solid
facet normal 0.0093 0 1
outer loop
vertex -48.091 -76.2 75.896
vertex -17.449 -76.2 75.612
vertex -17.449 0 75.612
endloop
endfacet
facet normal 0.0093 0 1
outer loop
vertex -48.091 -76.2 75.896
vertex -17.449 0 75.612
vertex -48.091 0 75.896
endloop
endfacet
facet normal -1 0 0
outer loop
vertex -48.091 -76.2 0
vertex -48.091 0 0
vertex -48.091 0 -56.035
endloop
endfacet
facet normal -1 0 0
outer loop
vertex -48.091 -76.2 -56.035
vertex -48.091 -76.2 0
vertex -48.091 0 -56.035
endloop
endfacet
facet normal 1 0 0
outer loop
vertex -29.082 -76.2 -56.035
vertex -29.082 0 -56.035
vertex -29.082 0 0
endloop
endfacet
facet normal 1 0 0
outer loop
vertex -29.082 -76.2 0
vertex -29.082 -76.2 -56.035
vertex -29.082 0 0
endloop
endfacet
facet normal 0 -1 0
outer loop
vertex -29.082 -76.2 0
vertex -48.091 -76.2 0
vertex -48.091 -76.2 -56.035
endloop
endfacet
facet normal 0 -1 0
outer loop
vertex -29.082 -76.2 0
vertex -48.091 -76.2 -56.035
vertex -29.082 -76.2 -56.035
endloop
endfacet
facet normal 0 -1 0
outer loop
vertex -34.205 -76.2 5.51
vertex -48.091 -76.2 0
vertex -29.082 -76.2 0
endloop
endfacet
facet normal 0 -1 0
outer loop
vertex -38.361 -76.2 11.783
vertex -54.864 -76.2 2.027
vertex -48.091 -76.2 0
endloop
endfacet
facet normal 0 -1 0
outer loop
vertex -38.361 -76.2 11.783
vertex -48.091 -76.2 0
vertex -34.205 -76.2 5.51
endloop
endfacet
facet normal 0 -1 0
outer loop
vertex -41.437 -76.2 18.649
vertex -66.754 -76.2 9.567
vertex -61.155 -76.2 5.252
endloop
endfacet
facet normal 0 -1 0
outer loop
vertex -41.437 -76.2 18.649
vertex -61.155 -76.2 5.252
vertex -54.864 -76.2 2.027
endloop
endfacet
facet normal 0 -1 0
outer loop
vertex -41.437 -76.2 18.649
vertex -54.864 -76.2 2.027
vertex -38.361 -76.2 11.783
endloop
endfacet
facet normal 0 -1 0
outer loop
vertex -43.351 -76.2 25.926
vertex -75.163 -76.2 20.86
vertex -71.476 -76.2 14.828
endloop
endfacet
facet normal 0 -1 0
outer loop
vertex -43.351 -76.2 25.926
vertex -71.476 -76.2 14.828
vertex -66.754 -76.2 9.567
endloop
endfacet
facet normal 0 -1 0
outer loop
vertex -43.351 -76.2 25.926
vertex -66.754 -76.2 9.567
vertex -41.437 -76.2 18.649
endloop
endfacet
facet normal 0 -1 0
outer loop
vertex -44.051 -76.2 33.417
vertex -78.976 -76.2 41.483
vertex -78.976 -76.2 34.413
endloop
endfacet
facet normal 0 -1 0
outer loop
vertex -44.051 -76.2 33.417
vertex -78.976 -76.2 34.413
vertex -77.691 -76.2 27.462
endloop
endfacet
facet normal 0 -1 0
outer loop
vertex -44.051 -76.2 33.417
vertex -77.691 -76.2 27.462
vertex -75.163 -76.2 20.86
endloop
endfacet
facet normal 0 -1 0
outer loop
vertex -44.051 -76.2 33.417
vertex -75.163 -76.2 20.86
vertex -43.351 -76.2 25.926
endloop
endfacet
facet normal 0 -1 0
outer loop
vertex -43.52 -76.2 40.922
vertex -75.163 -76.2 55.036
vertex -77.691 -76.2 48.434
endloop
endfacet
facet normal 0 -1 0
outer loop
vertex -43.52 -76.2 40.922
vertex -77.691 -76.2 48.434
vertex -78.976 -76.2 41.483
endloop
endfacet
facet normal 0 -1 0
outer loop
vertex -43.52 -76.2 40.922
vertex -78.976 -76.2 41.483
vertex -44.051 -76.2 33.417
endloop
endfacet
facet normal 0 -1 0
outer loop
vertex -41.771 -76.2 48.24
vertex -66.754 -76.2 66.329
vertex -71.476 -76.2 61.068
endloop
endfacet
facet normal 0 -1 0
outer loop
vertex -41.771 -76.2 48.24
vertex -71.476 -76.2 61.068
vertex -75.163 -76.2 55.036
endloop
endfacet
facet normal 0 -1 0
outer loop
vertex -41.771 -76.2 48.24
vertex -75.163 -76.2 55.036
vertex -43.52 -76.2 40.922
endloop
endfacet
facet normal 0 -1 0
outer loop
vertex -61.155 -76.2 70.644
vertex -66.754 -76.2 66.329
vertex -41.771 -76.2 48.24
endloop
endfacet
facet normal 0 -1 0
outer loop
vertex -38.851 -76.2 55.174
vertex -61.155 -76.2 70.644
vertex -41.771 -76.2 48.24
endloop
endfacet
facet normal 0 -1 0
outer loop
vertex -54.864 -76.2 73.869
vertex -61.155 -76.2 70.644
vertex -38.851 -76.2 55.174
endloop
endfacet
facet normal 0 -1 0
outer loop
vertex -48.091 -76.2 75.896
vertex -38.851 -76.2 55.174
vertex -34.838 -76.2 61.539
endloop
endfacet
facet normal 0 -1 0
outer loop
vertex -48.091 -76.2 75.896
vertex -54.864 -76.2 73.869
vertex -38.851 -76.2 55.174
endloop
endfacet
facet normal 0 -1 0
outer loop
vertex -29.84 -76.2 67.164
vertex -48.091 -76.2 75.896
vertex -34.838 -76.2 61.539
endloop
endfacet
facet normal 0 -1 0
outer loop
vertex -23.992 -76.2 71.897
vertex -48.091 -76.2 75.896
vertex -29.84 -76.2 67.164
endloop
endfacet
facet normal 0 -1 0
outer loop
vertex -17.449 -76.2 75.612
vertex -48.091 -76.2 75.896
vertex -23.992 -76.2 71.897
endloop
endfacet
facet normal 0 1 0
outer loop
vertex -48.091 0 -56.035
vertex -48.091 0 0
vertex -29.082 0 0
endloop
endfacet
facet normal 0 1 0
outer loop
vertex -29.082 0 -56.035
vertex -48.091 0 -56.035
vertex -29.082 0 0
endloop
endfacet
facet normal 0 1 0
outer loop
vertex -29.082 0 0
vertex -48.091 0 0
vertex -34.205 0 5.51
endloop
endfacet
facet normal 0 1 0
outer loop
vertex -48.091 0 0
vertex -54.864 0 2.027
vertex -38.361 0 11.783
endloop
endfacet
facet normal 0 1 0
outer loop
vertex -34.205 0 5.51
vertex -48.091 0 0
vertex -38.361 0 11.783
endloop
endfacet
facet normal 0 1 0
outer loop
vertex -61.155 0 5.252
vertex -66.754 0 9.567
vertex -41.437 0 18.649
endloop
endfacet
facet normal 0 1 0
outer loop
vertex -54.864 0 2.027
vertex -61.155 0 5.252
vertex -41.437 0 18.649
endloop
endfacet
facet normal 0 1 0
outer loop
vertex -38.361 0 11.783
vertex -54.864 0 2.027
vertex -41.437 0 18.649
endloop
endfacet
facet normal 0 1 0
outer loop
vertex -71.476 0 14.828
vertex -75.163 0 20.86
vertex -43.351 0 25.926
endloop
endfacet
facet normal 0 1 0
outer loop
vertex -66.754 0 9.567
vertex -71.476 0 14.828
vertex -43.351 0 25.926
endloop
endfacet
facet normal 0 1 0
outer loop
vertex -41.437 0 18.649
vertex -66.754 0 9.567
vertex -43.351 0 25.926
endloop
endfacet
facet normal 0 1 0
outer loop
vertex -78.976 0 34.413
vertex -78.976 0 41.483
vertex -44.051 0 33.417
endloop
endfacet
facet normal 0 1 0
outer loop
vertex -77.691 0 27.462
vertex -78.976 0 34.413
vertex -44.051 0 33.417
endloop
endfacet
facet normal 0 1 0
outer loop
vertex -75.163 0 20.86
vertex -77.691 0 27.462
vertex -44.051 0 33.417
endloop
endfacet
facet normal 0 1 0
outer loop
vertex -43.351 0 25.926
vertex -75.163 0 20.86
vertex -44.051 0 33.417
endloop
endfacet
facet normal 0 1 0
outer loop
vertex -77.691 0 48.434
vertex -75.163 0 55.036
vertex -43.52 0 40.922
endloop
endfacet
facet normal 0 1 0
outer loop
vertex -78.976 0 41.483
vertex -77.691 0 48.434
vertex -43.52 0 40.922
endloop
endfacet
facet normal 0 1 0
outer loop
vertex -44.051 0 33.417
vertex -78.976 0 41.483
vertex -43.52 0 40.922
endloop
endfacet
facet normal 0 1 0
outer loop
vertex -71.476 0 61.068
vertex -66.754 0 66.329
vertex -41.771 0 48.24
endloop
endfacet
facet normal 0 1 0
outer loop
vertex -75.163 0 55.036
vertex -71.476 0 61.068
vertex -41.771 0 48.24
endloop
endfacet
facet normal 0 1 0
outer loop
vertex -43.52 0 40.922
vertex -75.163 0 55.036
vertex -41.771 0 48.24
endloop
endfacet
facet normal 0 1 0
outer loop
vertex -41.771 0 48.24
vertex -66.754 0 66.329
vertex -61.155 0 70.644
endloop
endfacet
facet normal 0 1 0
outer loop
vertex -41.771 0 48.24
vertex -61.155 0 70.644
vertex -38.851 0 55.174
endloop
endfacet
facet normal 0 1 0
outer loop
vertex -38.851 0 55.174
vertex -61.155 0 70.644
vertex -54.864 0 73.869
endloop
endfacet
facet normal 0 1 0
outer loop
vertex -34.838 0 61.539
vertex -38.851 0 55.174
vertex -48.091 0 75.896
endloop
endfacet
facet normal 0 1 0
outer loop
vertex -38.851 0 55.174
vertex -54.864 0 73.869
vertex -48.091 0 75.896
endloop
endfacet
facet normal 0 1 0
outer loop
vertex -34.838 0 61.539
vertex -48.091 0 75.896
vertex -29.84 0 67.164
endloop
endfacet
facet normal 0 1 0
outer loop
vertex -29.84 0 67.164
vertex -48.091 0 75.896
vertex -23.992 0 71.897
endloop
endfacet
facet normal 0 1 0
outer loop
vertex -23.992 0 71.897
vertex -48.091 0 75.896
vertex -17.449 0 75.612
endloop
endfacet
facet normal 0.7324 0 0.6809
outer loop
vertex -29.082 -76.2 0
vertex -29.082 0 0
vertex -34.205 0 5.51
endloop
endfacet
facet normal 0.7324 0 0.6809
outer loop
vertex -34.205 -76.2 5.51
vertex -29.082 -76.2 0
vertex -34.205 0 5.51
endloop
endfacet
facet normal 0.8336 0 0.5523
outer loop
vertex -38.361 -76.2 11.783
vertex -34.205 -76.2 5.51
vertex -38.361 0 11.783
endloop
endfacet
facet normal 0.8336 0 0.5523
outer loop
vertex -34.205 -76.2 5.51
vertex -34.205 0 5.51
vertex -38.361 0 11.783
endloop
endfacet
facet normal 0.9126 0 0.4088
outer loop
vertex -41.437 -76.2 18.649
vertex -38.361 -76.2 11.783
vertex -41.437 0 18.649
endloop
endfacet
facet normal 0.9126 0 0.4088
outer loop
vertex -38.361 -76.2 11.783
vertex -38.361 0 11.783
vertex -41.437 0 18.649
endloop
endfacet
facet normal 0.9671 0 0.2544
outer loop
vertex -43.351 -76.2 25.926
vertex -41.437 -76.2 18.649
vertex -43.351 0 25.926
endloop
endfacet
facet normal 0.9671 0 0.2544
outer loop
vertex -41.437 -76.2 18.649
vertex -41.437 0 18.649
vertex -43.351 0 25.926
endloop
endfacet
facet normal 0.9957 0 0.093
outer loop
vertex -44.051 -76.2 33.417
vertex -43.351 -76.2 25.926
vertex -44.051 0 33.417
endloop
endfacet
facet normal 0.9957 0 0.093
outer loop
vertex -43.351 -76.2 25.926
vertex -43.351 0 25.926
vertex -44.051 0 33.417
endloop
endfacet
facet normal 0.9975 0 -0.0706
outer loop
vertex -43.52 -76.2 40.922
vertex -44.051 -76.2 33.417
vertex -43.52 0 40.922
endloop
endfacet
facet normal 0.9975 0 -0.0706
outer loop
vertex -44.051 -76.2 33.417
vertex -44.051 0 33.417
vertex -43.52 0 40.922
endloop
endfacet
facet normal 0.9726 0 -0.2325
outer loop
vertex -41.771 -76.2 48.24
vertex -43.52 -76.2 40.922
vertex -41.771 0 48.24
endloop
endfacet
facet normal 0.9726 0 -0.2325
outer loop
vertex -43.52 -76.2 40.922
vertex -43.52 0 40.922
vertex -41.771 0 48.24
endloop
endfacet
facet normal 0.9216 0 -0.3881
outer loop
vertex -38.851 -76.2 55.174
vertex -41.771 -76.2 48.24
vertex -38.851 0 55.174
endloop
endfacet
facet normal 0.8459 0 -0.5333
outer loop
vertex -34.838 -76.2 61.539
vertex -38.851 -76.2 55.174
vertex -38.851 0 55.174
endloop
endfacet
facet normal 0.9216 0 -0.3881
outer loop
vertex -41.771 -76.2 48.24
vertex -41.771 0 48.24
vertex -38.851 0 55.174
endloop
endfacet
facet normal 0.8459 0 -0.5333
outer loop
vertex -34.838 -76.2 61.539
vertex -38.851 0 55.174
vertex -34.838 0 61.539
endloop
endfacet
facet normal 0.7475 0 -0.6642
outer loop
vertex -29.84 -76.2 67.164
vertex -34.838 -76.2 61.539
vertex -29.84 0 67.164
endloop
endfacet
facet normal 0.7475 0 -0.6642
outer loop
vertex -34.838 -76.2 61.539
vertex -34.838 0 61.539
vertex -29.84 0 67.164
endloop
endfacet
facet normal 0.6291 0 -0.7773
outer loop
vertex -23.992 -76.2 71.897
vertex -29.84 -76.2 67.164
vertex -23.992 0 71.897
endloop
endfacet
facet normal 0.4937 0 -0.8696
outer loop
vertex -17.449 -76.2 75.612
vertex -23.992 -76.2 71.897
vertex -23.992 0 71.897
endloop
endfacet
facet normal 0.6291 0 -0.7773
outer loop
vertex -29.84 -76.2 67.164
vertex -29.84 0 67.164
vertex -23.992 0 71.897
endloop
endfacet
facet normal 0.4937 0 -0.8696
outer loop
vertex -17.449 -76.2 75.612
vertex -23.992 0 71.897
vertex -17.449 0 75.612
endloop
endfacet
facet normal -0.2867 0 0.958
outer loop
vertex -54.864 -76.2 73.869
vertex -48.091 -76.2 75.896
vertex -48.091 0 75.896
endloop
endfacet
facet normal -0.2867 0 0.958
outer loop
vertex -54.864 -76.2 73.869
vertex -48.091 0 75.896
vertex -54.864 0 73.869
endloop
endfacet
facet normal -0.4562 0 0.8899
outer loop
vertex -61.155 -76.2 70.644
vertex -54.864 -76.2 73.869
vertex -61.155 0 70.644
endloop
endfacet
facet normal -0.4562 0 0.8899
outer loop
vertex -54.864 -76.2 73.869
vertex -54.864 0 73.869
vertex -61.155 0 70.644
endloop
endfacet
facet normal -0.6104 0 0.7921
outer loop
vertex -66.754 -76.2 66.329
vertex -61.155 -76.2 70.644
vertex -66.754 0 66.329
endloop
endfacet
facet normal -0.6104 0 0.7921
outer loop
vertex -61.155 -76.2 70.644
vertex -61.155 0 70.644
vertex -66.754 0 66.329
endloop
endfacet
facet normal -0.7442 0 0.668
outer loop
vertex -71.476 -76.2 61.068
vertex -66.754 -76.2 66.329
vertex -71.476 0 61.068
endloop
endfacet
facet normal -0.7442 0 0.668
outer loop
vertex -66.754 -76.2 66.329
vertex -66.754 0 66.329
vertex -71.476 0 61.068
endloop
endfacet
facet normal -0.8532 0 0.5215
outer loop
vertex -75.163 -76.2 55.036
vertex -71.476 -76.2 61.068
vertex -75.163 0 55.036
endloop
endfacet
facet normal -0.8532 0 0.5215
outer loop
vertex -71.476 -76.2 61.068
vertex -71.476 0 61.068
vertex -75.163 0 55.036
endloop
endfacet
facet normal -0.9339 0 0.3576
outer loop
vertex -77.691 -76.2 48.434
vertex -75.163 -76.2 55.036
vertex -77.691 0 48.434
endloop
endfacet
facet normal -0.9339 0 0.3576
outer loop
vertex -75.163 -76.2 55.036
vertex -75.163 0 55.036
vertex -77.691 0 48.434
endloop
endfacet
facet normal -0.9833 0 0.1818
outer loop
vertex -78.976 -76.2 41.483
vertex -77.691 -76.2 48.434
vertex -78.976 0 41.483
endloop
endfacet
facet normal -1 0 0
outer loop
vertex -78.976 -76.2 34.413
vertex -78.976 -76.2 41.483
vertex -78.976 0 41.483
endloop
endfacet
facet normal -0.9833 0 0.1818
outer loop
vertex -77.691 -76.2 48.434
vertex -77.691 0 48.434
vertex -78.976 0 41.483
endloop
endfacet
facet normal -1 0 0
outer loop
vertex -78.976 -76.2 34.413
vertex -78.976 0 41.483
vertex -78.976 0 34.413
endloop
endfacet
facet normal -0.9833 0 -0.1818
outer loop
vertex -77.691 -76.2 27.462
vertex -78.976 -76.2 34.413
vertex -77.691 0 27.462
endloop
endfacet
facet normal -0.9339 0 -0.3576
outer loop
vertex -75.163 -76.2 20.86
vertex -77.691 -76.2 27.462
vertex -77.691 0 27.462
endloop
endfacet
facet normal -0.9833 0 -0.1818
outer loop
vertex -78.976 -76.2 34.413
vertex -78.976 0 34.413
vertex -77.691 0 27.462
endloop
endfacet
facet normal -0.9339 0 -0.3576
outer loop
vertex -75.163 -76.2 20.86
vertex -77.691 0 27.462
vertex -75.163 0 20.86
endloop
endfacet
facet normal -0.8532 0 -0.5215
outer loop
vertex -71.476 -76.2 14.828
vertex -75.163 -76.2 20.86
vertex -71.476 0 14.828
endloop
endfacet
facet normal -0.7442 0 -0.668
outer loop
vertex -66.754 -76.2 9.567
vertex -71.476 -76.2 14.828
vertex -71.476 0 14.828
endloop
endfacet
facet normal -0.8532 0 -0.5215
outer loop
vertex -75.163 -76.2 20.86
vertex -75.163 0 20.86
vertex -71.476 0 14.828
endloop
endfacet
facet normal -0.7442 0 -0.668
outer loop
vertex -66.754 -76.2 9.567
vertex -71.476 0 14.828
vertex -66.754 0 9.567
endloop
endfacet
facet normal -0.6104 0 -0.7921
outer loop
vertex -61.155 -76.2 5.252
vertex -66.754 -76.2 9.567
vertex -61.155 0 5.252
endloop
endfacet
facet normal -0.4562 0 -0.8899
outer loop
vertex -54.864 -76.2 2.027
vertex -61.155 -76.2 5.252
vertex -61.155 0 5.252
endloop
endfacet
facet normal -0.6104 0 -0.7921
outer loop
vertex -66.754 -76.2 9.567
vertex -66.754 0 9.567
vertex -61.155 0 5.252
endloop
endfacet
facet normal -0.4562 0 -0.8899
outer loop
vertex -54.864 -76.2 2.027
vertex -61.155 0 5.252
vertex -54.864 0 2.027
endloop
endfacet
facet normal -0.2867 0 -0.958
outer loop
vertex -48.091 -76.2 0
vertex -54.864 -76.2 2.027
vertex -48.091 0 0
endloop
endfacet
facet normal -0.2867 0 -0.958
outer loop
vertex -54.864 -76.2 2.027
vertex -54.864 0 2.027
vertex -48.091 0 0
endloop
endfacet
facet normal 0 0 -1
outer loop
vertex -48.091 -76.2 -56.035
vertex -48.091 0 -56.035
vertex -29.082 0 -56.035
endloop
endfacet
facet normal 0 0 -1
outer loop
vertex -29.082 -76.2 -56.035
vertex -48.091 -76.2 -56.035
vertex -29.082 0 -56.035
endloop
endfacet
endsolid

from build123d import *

# Parameters (mm, degrees)
F1_DEPTH = 76.2


with BuildPart() as f1:
    # F0 (on Front) → F1 (new body)
    with BuildSketch(Plane.XZ):
        with BuildLine():
            Line((-29.08165, -56.035373), (-29.08165, 0))
            ThreePointArc((-29.08165, 0), (-43.520037, 40.922253), (-17.44899, 75.612284))
            Line((-17.44899, 75.612284), (-48.091117, 75.89601))
            ThreePointArc((-48.091117, 75.89601), (-79.137953, 37.948005), (-48.091117, 0))
            Line((-48.091117, 0), (-48.091117, -56.035373))
            Line((-48.091117, -56.035373), (-29.08165, -56.035373))
        make_face()
    extrude(amount=F1_DEPTH)


solid = f1.part
